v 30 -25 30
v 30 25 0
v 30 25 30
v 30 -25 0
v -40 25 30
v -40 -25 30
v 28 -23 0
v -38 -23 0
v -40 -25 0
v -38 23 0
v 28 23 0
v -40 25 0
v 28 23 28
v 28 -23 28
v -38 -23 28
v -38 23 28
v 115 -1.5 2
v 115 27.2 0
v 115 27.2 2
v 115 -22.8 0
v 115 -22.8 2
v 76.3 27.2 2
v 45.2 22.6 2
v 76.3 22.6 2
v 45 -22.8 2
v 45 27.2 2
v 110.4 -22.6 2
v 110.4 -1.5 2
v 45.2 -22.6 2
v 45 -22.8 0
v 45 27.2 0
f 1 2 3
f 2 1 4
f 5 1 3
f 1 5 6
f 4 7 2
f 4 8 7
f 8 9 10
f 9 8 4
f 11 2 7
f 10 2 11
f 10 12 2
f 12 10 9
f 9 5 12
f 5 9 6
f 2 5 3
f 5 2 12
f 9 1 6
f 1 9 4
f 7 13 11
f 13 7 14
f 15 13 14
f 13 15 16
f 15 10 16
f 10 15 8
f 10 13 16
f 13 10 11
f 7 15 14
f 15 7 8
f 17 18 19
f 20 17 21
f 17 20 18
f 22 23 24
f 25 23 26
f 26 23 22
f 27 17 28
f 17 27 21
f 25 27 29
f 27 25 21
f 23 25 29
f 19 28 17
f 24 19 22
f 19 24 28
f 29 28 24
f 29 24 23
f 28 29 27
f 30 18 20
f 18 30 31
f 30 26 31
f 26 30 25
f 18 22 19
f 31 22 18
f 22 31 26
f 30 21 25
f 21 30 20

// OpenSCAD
// Two-part enclosure for small electronics board
// Part 1: Box (left)
// Part 2: Lid (right, printed upside down)
// Prints together with a 10 mm gap.

// --- Dimensions ---
// Box Outer Dimensions (X x Y x Z)
$box_outer_x = 70;
$box_outer_y = 50;
$box_outer_z = 30;

// Wall and Floor Thickness
$wall_thickness = 2;
$floor_thickness = 2;

// Lid Dimensions
// Plate thickness
$plate_thickness = 2;
// Lip dimensions (height and wall thickness)
$lip_height = 4;
$lip_wall_thickness = 1.5;
// Lip outer size (X x Y)
$lip_outer_x = 65.6;
$lip_outer_y = 45.6;

// Clearance
$clearance = 0.2;

// Gap between parts
$gap = 10;

// --- Configuration ---
// Set global resolution for curved shapes
$fn = 64;

// --- Part 1: The Box ---
// Position: Centered on its own footprint, then shifted left by half gap
// Footprint: $box_outer_x * $box_outer_y
translate([-($gap/2) - ($box_outer_x/2), -($box_outer_y/2), 0])
difference() {
    // Outer Box
    cube([
        $box_outer_x, 
        $box_outer_y, 
        $box_outer_z
    ]);
    
    // Inner Void (to create walls and floor)
    // Inner X = Outer X - 2*Wall
    // Inner Y = Outer Y - 2*Wall
    // Inner Z = Outer Z - Floor (Top is open)
    translate([
        $wall_thickness, 
        $wall_thickness, 
        0
    ])
    cube([
        $box_outer_x - (2 * $wall_thickness),
        $box_outer_y - (2 * $wall_thickness),
        $box_outer_z - $floor_thickness
    ]);
}

// --- Part 2: The Lid ---
// Position: Centered on its own footprint, then shifted right by half gap + box width
// Footprint: $lip_outer_x * $lip_outer_y
// Note: The user requested the lid to be printed "upside down" relative to the box opening logic,
// but physically it is a plate on the bed with a lip sticking UP.
// To print "upside down" in the sense of the lid covering the box, the lip must face UP.
// If the user meant the part geometry is inverted (lip facing down), it wouldn't cover the box.
// Assuming standard enclosure logic: Plate on bed, Lip goes up into the box.
// "Printed upside down" likely refers to the orientation of the part relative to the box (it's the top part).
// We place it on the +X side.

translate([
    $gap + ($box_outer_x/2), 
    -($lip_outer_y/2), 
    0
])
difference() {
    // 1. The Main Plate (70x50x2)
    // The user said "plate 70 x 50 x 2 mm". 
    // However, the lip outer size is 65.6 x 45.6. 
    // If the plate is 70x50, the lip (65.6x45.6) is smaller and centered.
    // This creates a rim around the lip.
    cube([
        $box_outer_x, // 70
        $box_outer_y, // 50
        $plate_thickness // 2
    ]);
    
    // 2. The Lip Void
    // We need to remove the material inside the lip dimensions to create the hole.
    // Lip Outer: 65.6 x 45.6
    // Lip Wall: 1.5
    // Lip Height: 4
    
    // Calculate Lip Inner Dimensions
    $lip_inner_x = $lip_outer_x - (2 * $lip_wall_thickness);
    $lip_inner_y = $lip_outer_y - (2 * $lip_wall_thickness);
    
    // The void starts at Z = $plate_thickness and goes up by $lip_height
    translate([
        ($lip_outer_x/2) - $lip_wall_thickness, // Center X
        ($lip_outer_y/2) - $lip_wall_thickness, // Center Y
        $plate_thickness // Start at top of plate
    ])
    cube([
        $lip_inner_x,
        $lip_inner_y,
        $lip_height
    ]);
    
    // 3. Cut the Lip Wall Material (to make the hole round/clean and ensure fit)
    // We cut a shape slightly larger than the inner lip dimensions to ensure the 0.2mm clearance is respected
    // and the hole is clean.
    // Target inner size for the hole: Lip Outer - 2*Clearance
    $cut_x = $lip_outer_x - (2 * $clearance);
    $cut_y = $lip_outer_y - (2 * $clearance);
    
    translate([
        ($lip_outer_x/2) - ($cut_x/2),
        ($lip_outer_y/2) - ($cut_y/2),
        $plate_thickness
    ])
    cube([
        $cut_x,
        $cut_y,
        $lip_height + 0.1 // Extend slightly past lip height to ensure clean cut
    ]);
}
